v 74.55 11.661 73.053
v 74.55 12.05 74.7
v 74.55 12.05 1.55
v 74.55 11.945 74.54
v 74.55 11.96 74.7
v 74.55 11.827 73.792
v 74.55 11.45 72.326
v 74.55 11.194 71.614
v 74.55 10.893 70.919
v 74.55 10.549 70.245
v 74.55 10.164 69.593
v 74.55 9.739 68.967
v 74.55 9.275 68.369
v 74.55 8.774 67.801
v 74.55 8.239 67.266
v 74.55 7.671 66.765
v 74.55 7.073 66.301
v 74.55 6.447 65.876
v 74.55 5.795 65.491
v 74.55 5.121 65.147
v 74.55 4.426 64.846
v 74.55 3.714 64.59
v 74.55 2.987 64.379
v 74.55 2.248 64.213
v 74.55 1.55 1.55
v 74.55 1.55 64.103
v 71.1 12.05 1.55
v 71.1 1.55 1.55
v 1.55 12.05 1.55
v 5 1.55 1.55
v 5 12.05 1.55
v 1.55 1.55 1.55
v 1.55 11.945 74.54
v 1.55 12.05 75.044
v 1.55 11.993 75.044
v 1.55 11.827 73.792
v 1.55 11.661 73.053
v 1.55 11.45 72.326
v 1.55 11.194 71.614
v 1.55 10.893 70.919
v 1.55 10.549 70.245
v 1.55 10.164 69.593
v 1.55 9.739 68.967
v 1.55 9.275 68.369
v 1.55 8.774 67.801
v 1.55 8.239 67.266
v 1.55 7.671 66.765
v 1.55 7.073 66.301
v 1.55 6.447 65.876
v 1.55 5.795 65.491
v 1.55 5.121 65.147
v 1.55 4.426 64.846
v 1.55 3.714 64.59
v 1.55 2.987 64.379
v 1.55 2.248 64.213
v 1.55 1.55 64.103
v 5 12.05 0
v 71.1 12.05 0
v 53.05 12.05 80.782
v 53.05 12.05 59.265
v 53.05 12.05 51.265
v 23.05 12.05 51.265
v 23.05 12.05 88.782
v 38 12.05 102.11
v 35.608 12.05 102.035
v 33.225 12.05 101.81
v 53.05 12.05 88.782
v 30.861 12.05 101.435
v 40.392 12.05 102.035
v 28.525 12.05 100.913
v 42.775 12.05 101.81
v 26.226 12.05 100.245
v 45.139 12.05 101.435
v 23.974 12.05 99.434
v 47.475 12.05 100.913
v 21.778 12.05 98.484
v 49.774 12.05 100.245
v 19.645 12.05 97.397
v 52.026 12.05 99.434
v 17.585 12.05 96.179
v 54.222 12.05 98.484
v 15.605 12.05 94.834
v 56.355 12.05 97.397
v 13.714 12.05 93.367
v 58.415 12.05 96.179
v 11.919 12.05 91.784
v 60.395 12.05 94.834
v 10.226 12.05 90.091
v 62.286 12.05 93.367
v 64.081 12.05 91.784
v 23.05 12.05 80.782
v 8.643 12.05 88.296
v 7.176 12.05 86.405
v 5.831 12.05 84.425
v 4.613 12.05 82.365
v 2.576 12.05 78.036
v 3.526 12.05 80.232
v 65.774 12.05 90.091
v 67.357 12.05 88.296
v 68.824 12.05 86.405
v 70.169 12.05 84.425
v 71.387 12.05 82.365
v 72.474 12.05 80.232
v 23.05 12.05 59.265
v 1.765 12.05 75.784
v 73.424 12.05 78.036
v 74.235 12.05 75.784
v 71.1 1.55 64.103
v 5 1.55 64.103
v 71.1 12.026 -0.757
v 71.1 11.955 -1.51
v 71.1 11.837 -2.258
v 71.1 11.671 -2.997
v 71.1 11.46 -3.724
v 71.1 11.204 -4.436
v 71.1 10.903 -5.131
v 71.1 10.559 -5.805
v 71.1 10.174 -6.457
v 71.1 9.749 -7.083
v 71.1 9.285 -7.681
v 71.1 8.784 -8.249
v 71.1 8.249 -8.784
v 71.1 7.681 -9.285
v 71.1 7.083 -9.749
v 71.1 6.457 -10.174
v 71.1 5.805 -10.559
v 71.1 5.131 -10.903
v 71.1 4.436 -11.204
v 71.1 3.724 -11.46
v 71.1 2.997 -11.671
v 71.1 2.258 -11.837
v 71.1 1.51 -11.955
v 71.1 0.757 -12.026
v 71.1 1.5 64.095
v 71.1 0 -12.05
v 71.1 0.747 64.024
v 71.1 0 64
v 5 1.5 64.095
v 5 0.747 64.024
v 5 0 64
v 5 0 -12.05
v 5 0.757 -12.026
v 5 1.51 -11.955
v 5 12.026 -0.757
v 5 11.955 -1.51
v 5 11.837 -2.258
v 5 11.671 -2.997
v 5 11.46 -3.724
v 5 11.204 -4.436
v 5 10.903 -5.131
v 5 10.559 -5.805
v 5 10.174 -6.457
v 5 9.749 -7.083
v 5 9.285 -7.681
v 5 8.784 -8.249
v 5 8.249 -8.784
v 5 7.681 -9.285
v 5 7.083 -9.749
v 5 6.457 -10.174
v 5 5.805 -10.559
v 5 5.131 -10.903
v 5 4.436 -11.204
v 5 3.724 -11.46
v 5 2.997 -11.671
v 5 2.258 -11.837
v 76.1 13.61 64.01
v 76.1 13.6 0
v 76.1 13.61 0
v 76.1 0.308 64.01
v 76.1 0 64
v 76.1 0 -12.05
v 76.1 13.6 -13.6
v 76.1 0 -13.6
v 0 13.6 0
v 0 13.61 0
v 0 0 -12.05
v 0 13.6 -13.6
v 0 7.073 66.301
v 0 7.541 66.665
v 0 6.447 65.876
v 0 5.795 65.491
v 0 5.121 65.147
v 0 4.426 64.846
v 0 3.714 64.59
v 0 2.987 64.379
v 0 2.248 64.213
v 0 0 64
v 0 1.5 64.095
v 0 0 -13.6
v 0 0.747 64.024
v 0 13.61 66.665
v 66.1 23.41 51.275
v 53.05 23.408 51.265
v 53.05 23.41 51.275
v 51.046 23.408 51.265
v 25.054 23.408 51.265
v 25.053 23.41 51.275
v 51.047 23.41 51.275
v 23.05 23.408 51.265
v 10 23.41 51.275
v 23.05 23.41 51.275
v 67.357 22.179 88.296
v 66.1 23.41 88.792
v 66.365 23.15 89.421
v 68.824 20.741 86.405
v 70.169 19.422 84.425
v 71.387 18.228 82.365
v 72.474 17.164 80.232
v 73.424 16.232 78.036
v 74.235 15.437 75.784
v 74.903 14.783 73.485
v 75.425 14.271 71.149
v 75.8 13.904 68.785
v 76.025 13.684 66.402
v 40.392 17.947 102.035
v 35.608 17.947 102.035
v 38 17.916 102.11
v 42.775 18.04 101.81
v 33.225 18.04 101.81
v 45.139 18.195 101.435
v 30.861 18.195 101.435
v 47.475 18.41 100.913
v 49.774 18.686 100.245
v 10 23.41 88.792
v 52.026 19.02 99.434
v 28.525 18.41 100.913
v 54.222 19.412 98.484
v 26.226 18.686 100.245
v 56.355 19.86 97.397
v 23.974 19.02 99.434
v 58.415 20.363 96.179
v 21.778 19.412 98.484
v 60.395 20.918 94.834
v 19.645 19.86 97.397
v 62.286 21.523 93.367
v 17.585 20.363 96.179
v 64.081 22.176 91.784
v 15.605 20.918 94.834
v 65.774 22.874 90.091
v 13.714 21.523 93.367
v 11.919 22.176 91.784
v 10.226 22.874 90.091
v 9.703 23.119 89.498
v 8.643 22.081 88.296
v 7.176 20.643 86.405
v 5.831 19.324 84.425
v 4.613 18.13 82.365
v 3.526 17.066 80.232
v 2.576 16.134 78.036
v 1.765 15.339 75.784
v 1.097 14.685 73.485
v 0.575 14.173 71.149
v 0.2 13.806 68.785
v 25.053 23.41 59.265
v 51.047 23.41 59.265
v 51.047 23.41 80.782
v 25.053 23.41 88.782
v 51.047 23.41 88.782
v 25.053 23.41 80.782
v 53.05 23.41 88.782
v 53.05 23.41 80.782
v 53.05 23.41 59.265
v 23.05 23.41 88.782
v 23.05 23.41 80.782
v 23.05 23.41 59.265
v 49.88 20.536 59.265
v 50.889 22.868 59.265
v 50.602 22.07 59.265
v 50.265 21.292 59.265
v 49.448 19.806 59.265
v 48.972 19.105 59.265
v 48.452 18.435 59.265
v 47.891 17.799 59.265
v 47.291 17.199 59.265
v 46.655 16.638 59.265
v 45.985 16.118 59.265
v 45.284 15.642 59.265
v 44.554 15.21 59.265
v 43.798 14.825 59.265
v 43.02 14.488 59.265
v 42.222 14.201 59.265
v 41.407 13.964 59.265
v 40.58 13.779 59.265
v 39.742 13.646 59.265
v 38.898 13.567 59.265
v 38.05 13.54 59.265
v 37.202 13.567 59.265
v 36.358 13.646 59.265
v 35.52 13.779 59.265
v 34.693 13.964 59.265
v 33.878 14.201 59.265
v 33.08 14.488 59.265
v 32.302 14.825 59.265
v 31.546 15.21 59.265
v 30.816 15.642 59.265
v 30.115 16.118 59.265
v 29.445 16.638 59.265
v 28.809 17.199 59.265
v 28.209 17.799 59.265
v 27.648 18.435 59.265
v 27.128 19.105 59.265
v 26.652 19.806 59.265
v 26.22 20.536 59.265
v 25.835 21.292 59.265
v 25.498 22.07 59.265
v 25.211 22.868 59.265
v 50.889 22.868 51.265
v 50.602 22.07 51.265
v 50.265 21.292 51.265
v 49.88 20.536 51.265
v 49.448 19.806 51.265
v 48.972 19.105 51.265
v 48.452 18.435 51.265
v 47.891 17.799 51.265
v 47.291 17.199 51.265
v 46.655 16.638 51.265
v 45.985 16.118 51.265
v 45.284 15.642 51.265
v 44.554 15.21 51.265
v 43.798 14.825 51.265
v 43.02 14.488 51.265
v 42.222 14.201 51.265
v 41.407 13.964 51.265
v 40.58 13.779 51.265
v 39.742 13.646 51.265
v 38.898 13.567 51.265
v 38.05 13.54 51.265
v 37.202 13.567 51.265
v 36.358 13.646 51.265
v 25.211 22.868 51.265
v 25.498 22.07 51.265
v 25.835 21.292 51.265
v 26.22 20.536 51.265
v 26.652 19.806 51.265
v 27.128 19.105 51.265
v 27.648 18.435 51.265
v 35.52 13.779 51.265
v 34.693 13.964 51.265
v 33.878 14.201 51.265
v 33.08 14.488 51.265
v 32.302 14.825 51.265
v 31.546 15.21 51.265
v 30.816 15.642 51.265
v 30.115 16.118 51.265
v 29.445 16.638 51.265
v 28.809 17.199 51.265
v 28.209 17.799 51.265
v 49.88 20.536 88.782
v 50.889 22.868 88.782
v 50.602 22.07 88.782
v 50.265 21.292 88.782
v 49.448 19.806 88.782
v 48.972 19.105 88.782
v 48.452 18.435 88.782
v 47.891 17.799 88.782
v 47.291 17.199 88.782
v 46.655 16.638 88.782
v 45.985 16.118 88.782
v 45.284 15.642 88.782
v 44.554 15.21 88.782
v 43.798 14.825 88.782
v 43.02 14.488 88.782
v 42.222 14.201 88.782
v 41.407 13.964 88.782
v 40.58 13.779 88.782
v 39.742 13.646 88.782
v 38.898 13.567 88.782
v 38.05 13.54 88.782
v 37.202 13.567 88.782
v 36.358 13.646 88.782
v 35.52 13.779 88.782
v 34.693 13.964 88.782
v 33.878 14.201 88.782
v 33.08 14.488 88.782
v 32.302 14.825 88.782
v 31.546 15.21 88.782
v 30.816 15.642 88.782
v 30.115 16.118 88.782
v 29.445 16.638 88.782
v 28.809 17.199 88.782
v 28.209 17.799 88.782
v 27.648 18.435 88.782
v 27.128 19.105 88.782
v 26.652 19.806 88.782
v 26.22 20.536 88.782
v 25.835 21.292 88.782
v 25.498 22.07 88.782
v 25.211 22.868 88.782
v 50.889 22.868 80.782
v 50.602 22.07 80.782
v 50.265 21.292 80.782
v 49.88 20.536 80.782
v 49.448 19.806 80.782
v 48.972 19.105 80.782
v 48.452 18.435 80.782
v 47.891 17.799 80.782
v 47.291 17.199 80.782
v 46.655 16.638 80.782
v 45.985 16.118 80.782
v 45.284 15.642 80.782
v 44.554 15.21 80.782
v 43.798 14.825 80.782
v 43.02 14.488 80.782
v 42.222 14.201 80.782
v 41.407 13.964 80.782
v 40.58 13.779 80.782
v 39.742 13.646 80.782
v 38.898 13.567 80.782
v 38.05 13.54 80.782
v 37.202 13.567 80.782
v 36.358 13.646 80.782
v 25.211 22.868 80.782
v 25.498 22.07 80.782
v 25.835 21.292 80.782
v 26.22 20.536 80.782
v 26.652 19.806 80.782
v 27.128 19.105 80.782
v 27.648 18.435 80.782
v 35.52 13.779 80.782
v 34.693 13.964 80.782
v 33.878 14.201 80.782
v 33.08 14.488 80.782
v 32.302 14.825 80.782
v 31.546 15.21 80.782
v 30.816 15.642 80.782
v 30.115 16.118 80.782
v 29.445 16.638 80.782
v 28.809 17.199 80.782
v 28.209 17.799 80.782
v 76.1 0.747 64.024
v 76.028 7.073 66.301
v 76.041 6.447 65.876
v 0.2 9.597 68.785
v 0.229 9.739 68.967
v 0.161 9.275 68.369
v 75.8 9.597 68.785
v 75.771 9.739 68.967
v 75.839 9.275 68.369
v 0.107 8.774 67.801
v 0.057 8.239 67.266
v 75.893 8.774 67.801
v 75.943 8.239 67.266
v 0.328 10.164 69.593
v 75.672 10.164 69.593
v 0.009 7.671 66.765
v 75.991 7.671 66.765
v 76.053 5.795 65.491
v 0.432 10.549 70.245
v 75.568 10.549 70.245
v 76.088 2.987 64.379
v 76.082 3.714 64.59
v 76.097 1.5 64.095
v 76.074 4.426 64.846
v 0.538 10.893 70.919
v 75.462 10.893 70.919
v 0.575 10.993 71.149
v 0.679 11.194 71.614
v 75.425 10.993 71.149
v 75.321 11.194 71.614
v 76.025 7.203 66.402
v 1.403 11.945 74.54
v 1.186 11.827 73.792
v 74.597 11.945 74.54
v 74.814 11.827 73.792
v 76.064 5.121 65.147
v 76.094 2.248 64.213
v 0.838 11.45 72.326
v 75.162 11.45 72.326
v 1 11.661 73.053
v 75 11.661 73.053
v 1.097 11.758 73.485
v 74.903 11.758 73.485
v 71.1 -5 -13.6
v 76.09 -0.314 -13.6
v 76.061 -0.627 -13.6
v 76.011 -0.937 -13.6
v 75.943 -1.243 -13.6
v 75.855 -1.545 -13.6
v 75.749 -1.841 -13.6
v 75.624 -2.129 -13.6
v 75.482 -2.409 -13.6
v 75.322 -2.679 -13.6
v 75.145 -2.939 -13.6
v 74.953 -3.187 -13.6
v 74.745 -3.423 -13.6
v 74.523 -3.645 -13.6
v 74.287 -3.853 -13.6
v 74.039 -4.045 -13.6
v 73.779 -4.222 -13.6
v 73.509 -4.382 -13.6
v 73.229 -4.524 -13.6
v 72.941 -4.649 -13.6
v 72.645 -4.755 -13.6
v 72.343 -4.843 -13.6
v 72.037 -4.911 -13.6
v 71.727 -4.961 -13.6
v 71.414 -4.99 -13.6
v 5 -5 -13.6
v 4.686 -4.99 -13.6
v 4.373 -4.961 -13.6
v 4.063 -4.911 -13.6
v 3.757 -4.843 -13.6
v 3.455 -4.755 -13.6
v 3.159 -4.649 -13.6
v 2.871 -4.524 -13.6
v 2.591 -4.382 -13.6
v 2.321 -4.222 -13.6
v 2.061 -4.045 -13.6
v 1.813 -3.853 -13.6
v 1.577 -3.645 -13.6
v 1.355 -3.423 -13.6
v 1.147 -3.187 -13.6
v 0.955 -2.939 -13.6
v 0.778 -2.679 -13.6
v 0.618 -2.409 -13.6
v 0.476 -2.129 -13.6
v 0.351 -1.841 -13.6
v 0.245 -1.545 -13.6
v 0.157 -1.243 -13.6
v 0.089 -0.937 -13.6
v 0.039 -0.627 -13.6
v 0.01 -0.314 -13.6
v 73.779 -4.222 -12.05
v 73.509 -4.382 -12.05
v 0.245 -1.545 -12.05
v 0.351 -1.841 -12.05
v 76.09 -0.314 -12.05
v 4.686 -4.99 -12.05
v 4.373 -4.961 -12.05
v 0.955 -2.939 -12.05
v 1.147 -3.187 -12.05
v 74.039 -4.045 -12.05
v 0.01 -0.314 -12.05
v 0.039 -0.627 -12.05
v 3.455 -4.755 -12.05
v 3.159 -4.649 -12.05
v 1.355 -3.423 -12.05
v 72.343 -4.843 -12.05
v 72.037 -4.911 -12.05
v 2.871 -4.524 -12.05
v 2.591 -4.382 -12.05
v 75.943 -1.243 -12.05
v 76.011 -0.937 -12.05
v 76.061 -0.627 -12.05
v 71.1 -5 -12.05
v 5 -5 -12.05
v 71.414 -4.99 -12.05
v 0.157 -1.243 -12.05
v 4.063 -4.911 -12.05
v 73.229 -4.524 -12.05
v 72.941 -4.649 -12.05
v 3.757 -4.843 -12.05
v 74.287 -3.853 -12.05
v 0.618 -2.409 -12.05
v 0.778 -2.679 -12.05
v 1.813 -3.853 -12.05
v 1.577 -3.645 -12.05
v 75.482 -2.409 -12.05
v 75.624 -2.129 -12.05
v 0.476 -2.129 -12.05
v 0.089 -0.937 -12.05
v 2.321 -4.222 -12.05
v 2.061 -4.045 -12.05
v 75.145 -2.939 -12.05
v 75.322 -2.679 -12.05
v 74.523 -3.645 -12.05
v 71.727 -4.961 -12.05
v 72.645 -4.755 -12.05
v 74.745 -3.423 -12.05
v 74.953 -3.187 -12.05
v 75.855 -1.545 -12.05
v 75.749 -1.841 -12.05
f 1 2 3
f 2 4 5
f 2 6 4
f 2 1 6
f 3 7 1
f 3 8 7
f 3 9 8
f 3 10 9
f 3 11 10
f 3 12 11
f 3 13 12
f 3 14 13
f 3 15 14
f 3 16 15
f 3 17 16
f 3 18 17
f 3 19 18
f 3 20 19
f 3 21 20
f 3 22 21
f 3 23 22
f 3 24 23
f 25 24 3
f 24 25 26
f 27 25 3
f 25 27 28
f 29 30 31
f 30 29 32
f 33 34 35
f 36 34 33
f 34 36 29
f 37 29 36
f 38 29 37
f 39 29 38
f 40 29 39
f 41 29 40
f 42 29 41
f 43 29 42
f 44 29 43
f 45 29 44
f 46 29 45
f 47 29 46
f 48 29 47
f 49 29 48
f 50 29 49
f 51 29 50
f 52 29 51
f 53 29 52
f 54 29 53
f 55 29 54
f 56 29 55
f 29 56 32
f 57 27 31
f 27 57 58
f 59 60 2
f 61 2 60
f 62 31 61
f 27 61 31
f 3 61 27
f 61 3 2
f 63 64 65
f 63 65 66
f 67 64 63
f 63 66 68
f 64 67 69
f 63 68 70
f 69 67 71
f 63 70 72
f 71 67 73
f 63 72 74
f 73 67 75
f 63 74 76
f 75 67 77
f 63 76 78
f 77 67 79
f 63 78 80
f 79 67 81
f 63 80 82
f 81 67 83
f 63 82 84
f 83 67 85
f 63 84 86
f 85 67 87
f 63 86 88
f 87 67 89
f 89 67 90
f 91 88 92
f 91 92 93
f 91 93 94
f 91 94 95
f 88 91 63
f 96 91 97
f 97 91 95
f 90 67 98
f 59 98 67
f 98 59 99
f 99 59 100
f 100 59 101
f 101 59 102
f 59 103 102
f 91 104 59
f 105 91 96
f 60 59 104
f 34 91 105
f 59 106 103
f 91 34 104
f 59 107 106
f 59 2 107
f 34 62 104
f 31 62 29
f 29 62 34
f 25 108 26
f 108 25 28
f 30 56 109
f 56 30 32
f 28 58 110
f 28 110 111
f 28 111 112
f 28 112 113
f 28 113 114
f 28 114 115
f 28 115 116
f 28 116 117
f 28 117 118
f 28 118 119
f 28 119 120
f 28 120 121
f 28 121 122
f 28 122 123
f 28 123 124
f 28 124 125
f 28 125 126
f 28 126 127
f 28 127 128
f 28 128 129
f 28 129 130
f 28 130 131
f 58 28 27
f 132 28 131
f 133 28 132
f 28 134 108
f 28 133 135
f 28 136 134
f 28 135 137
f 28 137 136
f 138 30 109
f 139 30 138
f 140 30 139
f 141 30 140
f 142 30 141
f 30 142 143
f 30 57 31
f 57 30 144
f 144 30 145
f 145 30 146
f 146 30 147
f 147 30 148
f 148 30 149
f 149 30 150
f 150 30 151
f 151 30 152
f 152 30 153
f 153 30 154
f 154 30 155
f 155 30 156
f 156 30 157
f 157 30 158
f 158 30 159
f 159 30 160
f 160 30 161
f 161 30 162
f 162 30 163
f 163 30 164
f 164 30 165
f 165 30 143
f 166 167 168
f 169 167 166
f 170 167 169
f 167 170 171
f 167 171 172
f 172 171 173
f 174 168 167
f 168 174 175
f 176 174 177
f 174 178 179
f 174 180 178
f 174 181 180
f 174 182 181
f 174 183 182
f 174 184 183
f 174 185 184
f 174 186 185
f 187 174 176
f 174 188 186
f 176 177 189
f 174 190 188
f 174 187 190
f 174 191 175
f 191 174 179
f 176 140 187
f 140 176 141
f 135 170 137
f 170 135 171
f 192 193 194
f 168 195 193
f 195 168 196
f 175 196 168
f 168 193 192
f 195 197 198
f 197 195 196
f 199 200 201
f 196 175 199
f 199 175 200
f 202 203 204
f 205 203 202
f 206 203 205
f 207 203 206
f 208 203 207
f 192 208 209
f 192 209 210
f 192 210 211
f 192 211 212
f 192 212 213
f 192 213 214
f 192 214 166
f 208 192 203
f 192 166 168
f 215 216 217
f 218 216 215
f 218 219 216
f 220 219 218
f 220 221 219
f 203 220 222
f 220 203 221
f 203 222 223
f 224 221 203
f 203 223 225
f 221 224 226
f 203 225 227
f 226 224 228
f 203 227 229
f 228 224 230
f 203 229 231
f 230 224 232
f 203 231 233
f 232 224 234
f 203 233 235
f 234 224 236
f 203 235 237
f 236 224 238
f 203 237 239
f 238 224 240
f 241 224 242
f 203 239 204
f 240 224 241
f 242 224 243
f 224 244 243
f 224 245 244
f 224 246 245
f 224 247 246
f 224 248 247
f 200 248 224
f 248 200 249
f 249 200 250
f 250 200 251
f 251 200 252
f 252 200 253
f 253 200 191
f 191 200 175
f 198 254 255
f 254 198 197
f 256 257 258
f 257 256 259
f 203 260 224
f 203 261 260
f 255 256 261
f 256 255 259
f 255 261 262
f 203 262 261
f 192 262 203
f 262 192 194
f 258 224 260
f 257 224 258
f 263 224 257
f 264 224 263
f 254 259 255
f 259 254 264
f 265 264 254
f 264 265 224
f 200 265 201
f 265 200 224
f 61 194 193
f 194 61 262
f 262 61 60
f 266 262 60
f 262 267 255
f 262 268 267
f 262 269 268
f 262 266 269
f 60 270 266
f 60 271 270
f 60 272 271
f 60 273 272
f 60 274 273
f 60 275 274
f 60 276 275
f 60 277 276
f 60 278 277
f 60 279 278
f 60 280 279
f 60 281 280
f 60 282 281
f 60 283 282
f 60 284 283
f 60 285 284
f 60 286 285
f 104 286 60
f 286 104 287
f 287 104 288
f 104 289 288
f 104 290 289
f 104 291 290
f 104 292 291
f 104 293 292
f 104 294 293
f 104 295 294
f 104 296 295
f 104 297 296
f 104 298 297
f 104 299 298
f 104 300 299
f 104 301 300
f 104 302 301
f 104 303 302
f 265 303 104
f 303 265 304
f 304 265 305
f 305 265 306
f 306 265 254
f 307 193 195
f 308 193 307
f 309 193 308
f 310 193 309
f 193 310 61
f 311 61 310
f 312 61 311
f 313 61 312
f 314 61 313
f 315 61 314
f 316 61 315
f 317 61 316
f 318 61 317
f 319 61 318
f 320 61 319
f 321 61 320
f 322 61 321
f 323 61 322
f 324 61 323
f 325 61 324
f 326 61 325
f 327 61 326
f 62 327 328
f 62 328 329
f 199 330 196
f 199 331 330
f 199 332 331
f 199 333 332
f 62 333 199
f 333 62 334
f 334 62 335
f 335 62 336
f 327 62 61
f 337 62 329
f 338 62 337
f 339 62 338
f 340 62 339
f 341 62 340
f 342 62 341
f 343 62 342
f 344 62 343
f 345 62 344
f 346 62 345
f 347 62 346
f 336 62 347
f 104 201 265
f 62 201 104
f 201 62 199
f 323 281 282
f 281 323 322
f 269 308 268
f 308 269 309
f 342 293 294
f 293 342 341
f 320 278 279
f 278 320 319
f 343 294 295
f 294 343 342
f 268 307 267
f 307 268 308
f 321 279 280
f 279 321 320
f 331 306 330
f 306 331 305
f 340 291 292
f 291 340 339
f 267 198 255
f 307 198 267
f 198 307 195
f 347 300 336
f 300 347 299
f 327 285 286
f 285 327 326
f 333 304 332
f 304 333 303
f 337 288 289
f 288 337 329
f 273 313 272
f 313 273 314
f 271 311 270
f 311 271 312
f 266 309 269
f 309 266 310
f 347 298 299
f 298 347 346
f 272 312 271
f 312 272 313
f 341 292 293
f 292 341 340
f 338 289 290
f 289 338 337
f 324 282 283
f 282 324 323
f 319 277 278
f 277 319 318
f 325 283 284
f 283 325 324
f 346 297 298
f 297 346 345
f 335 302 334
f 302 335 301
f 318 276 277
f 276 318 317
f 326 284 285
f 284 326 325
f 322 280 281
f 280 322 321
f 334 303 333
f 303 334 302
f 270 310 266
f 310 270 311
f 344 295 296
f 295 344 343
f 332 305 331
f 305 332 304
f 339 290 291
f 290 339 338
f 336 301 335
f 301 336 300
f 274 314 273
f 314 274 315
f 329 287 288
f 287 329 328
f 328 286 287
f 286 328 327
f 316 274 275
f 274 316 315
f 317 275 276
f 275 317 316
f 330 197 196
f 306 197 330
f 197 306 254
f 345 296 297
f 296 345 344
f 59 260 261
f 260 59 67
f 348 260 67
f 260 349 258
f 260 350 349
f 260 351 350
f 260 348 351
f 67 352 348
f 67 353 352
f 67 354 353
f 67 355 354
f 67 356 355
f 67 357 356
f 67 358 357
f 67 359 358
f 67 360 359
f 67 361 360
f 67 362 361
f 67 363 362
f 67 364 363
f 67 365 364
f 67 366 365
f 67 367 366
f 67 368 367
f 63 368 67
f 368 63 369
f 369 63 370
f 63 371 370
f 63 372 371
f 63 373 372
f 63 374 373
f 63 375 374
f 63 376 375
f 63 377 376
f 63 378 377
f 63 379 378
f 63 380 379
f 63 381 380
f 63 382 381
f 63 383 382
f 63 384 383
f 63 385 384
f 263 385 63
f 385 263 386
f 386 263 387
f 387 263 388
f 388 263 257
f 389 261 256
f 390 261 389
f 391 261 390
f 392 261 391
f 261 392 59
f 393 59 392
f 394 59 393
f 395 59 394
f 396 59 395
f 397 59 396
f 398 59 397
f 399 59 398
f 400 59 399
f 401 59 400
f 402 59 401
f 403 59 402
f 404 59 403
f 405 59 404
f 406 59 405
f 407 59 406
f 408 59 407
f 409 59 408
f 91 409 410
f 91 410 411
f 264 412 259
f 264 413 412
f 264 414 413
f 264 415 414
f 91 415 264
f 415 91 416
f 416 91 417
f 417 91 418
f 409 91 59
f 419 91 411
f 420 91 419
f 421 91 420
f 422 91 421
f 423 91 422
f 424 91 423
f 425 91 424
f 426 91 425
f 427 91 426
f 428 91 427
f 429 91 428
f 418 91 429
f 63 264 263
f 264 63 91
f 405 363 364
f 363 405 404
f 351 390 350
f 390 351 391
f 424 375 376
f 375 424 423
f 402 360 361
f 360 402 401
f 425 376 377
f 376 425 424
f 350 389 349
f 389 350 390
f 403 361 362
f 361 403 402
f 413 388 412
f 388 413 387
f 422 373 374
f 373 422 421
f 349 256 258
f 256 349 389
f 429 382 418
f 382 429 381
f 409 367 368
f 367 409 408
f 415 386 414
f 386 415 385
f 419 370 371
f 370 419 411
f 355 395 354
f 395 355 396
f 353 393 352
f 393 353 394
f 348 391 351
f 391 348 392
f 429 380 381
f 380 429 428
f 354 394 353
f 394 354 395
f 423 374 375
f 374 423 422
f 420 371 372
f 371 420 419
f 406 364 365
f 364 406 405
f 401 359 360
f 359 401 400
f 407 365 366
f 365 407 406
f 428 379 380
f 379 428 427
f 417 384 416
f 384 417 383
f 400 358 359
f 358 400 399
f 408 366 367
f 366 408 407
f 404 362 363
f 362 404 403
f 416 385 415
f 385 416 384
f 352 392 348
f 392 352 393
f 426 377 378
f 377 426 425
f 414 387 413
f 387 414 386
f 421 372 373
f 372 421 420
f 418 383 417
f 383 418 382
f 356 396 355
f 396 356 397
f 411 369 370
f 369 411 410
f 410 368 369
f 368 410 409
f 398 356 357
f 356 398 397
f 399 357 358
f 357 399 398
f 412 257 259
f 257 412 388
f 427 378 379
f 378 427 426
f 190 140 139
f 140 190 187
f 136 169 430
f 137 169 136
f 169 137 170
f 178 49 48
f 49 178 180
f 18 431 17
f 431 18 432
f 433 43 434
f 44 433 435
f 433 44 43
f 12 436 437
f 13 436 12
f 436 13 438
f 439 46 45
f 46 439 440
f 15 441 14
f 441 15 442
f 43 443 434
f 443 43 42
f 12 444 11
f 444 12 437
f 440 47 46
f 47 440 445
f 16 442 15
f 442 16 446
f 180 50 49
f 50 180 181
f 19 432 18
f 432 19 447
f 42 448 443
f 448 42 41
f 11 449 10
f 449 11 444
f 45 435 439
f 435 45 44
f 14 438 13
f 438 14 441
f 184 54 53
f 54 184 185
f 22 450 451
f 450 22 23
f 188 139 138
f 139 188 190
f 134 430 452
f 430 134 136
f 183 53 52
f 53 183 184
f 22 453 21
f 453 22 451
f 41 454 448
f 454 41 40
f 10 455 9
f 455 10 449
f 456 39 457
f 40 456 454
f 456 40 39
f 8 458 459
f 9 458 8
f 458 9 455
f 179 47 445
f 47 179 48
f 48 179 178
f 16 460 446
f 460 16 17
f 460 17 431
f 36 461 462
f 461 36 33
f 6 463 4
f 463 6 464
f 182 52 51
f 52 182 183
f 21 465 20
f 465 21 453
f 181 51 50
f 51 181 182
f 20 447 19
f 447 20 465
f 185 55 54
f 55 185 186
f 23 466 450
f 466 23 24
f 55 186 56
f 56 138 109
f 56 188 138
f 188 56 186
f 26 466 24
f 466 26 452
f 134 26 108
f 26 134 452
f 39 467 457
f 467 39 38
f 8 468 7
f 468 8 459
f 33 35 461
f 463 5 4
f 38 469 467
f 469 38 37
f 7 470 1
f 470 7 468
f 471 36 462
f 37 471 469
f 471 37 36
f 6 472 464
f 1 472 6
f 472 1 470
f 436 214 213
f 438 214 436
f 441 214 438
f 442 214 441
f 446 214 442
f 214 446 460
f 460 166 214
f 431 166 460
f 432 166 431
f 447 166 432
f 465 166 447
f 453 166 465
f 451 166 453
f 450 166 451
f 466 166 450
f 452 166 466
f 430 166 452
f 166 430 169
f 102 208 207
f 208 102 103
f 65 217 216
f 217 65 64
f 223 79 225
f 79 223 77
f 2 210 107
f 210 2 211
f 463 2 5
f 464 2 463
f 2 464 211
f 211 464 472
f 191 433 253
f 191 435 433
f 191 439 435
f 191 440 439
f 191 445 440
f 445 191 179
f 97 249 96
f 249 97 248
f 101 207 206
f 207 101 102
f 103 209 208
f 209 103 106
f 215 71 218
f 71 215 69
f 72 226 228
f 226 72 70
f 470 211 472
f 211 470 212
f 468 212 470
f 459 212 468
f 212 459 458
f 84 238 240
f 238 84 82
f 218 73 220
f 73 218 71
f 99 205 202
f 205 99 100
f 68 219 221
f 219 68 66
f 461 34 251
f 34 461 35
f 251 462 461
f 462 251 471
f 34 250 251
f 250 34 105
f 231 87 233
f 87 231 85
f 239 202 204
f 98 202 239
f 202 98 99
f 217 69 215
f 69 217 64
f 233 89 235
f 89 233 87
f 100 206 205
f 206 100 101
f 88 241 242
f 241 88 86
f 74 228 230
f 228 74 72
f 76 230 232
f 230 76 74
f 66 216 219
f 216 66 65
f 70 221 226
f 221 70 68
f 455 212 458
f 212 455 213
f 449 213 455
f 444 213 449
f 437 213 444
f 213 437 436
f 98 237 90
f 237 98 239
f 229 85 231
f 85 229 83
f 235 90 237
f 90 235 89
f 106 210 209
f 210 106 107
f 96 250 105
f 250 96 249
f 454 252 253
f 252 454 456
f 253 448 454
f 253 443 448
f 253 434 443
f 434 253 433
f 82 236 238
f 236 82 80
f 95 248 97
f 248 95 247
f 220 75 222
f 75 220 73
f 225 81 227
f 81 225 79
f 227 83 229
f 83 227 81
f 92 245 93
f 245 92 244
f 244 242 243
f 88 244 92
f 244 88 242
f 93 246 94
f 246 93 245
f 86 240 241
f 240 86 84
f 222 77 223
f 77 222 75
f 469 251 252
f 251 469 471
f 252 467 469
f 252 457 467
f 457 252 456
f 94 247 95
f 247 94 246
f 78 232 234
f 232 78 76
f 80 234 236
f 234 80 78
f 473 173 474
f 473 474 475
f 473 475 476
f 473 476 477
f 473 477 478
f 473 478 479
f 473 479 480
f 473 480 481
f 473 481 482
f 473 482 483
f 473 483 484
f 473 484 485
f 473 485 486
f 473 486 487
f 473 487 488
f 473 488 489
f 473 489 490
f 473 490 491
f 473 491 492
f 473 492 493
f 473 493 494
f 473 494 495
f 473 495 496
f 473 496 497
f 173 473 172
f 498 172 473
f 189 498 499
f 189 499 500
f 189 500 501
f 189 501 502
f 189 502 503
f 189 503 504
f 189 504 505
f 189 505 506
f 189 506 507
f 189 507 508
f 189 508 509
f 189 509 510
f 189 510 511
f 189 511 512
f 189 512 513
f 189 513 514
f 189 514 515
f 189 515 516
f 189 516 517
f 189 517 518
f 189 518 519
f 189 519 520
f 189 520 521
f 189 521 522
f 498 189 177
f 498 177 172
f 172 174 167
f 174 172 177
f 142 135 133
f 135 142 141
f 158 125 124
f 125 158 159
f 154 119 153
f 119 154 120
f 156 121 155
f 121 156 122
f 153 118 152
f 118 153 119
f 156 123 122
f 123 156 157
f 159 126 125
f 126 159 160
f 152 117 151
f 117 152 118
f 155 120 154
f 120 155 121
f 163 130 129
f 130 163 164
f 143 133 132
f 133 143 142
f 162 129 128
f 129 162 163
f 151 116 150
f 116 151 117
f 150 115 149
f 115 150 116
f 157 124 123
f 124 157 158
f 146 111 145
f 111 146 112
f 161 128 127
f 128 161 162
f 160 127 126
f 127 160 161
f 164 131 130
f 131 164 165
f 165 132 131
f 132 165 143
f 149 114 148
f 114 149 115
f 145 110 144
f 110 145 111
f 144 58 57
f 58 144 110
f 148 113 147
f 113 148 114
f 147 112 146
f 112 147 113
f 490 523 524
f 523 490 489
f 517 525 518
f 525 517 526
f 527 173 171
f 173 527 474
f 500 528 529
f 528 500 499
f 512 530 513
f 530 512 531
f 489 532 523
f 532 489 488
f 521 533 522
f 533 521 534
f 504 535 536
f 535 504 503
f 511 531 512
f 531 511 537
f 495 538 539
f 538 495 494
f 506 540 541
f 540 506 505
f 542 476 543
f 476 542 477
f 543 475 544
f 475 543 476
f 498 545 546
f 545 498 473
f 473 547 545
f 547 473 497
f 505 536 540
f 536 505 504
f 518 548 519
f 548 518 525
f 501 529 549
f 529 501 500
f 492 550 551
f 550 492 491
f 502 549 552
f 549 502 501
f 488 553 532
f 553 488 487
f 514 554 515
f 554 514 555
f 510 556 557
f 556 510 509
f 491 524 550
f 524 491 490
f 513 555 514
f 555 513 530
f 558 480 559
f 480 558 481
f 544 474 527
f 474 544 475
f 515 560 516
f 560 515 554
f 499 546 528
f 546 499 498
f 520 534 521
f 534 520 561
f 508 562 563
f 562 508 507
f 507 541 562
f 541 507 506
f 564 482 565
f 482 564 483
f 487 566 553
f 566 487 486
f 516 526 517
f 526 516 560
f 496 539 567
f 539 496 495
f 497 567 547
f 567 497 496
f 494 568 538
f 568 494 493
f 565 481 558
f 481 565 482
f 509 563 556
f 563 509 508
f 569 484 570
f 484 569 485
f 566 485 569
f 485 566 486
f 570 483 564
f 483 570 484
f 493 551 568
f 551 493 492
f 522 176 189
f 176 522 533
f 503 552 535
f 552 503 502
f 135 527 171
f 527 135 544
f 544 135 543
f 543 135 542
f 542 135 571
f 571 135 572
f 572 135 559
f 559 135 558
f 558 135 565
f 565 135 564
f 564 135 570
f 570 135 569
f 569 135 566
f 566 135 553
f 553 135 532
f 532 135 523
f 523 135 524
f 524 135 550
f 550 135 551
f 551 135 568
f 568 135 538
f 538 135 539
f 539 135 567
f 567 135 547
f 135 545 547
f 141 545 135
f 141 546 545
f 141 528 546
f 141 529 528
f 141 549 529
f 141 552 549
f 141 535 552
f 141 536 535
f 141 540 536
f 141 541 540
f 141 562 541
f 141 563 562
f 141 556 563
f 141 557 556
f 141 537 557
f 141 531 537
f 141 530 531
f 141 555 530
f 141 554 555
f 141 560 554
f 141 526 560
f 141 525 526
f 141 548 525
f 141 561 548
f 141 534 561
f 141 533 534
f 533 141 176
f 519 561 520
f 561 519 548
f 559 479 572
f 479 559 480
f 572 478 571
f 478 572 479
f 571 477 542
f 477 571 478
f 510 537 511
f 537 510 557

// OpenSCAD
// in mm

phone_width = 73;
phone_depth = 10.5;
wall = 1.55; // wall thickness

holder_border_width = 5;

front_length = 5;
front_radius = front_length;

cable_tie_width = 8;
cable_tie_depth = 1.5;
cable_tie_radius = 15;

cut_height = 64; // adjusts also the height

$fn = 100; // details

holder_width = phone_width + 2*wall;
holder_depth = phone_depth + 2*wall;

cut_radius = holder_depth - wall;

holder_height = cut_height + phone_width/2 + cut_radius;

holder_square_height = holder_height/3;
holder_square_depth = holder_depth/2 + 3;
holder_square_z = 1/2* holder_height-5;

translate([0, -front_length + front_radius, -holder_depth])
roundedcube(holder_width, front_length, wall, front_radius);

union(){
    difference(){
        difference(){
            union(){
                difference(){
                    cube([holder_width, holder_depth, holder_height]);
                    
                    union(){
                        translate([wall, wall, wall])
                        cube([phone_width, phone_depth, holder_height]);
                        
                        translate([holder_border_width, -0.01, -0.005])
                        cube([holder_width - 2*holder_border_width, holder_depth-wall+0.01, holder_height + 0.01]);
                    }
                }
                
                // thickness
                hull(){
                    translate([0, holder_depth, 0]){
                        cube([holder_width, 0.01, holder_height]);
                        
                        translate([2*holder_border_width, holder_square_depth, holder_square_z])
                            cube([holder_width - 4*holder_border_width, 0.01, holder_square_height]);
                    }
                }
            }
            // cable ties
            union(){
                translate([holder_width/2, holder_depth + cable_tie_radius - wall - 0.01, holder_square_z])
                    cable_tie_hole();
                translate([holder_width/2, holder_depth + cable_tie_radius - wall - 0.01, holder_square_z+holder_square_height-cable_tie_width])
                    cable_tie_hole();
            
                // cut for buttons                
                translate([-0.01, -0.01, cut_height+cut_radius]){
                    rotate([0, 90, 0])
                    cylinder(r = cut_radius, h=holder_width+0.1);
                    cube([holder_width+0.1, holder_depth-wall, holder_height]);
                }
            }
        }
        // top roundness
        translate([-0.05, 0, cut_height+0.01])
        difference(){   
            cube([holder_width+0.1, 2*holder_depth, holder_height - cut_height]);
            translate([holder_width/2, 2*holder_depth+0.01, 0])
            rotate([90, 0, 0])
            cylinder(r=holder_width/2+0.05, h=2*holder_depth+0.1);
        }
    }
    // bottom for sound
    sound_coube_height = holder_depth;
    difference(){
        translate([0, 0, -sound_coube_height])
        cube([holder_width, holder_depth, sound_coube_height]);
        
        translate([holder_border_width, 0, 0])
        rotate([0, 90, 0])
        cylinder(r=sound_coube_height-wall, h = holder_width - 2*holder_border_width);
    }
}

module cable_tie_hole(){
    difference(){
        translate([-cable_tie_radius, -cable_tie_radius, -0.01])
            cube([2*cable_tie_radius, cable_tie_radius, cable_tie_width]);
        translate([0, 0, -0.1])
            cylinder(h=cable_tie_width + 1, r=cable_tie_radius - cable_tie_depth);
    }
}

module roundedcube(l, w, h, r, center=false){
    hull(){
        translate([r,r,0])cylinder(h=h,r=r, center=center);
        translate([l-r,r,0])cylinder(h=h,r=r, center=center);

        translate([r,w-r,0])cylinder(h=h,r=r, center=center);
        translate([l-r,w-r,0])cylinder(h=h,r=r, center=center);
    }
}
